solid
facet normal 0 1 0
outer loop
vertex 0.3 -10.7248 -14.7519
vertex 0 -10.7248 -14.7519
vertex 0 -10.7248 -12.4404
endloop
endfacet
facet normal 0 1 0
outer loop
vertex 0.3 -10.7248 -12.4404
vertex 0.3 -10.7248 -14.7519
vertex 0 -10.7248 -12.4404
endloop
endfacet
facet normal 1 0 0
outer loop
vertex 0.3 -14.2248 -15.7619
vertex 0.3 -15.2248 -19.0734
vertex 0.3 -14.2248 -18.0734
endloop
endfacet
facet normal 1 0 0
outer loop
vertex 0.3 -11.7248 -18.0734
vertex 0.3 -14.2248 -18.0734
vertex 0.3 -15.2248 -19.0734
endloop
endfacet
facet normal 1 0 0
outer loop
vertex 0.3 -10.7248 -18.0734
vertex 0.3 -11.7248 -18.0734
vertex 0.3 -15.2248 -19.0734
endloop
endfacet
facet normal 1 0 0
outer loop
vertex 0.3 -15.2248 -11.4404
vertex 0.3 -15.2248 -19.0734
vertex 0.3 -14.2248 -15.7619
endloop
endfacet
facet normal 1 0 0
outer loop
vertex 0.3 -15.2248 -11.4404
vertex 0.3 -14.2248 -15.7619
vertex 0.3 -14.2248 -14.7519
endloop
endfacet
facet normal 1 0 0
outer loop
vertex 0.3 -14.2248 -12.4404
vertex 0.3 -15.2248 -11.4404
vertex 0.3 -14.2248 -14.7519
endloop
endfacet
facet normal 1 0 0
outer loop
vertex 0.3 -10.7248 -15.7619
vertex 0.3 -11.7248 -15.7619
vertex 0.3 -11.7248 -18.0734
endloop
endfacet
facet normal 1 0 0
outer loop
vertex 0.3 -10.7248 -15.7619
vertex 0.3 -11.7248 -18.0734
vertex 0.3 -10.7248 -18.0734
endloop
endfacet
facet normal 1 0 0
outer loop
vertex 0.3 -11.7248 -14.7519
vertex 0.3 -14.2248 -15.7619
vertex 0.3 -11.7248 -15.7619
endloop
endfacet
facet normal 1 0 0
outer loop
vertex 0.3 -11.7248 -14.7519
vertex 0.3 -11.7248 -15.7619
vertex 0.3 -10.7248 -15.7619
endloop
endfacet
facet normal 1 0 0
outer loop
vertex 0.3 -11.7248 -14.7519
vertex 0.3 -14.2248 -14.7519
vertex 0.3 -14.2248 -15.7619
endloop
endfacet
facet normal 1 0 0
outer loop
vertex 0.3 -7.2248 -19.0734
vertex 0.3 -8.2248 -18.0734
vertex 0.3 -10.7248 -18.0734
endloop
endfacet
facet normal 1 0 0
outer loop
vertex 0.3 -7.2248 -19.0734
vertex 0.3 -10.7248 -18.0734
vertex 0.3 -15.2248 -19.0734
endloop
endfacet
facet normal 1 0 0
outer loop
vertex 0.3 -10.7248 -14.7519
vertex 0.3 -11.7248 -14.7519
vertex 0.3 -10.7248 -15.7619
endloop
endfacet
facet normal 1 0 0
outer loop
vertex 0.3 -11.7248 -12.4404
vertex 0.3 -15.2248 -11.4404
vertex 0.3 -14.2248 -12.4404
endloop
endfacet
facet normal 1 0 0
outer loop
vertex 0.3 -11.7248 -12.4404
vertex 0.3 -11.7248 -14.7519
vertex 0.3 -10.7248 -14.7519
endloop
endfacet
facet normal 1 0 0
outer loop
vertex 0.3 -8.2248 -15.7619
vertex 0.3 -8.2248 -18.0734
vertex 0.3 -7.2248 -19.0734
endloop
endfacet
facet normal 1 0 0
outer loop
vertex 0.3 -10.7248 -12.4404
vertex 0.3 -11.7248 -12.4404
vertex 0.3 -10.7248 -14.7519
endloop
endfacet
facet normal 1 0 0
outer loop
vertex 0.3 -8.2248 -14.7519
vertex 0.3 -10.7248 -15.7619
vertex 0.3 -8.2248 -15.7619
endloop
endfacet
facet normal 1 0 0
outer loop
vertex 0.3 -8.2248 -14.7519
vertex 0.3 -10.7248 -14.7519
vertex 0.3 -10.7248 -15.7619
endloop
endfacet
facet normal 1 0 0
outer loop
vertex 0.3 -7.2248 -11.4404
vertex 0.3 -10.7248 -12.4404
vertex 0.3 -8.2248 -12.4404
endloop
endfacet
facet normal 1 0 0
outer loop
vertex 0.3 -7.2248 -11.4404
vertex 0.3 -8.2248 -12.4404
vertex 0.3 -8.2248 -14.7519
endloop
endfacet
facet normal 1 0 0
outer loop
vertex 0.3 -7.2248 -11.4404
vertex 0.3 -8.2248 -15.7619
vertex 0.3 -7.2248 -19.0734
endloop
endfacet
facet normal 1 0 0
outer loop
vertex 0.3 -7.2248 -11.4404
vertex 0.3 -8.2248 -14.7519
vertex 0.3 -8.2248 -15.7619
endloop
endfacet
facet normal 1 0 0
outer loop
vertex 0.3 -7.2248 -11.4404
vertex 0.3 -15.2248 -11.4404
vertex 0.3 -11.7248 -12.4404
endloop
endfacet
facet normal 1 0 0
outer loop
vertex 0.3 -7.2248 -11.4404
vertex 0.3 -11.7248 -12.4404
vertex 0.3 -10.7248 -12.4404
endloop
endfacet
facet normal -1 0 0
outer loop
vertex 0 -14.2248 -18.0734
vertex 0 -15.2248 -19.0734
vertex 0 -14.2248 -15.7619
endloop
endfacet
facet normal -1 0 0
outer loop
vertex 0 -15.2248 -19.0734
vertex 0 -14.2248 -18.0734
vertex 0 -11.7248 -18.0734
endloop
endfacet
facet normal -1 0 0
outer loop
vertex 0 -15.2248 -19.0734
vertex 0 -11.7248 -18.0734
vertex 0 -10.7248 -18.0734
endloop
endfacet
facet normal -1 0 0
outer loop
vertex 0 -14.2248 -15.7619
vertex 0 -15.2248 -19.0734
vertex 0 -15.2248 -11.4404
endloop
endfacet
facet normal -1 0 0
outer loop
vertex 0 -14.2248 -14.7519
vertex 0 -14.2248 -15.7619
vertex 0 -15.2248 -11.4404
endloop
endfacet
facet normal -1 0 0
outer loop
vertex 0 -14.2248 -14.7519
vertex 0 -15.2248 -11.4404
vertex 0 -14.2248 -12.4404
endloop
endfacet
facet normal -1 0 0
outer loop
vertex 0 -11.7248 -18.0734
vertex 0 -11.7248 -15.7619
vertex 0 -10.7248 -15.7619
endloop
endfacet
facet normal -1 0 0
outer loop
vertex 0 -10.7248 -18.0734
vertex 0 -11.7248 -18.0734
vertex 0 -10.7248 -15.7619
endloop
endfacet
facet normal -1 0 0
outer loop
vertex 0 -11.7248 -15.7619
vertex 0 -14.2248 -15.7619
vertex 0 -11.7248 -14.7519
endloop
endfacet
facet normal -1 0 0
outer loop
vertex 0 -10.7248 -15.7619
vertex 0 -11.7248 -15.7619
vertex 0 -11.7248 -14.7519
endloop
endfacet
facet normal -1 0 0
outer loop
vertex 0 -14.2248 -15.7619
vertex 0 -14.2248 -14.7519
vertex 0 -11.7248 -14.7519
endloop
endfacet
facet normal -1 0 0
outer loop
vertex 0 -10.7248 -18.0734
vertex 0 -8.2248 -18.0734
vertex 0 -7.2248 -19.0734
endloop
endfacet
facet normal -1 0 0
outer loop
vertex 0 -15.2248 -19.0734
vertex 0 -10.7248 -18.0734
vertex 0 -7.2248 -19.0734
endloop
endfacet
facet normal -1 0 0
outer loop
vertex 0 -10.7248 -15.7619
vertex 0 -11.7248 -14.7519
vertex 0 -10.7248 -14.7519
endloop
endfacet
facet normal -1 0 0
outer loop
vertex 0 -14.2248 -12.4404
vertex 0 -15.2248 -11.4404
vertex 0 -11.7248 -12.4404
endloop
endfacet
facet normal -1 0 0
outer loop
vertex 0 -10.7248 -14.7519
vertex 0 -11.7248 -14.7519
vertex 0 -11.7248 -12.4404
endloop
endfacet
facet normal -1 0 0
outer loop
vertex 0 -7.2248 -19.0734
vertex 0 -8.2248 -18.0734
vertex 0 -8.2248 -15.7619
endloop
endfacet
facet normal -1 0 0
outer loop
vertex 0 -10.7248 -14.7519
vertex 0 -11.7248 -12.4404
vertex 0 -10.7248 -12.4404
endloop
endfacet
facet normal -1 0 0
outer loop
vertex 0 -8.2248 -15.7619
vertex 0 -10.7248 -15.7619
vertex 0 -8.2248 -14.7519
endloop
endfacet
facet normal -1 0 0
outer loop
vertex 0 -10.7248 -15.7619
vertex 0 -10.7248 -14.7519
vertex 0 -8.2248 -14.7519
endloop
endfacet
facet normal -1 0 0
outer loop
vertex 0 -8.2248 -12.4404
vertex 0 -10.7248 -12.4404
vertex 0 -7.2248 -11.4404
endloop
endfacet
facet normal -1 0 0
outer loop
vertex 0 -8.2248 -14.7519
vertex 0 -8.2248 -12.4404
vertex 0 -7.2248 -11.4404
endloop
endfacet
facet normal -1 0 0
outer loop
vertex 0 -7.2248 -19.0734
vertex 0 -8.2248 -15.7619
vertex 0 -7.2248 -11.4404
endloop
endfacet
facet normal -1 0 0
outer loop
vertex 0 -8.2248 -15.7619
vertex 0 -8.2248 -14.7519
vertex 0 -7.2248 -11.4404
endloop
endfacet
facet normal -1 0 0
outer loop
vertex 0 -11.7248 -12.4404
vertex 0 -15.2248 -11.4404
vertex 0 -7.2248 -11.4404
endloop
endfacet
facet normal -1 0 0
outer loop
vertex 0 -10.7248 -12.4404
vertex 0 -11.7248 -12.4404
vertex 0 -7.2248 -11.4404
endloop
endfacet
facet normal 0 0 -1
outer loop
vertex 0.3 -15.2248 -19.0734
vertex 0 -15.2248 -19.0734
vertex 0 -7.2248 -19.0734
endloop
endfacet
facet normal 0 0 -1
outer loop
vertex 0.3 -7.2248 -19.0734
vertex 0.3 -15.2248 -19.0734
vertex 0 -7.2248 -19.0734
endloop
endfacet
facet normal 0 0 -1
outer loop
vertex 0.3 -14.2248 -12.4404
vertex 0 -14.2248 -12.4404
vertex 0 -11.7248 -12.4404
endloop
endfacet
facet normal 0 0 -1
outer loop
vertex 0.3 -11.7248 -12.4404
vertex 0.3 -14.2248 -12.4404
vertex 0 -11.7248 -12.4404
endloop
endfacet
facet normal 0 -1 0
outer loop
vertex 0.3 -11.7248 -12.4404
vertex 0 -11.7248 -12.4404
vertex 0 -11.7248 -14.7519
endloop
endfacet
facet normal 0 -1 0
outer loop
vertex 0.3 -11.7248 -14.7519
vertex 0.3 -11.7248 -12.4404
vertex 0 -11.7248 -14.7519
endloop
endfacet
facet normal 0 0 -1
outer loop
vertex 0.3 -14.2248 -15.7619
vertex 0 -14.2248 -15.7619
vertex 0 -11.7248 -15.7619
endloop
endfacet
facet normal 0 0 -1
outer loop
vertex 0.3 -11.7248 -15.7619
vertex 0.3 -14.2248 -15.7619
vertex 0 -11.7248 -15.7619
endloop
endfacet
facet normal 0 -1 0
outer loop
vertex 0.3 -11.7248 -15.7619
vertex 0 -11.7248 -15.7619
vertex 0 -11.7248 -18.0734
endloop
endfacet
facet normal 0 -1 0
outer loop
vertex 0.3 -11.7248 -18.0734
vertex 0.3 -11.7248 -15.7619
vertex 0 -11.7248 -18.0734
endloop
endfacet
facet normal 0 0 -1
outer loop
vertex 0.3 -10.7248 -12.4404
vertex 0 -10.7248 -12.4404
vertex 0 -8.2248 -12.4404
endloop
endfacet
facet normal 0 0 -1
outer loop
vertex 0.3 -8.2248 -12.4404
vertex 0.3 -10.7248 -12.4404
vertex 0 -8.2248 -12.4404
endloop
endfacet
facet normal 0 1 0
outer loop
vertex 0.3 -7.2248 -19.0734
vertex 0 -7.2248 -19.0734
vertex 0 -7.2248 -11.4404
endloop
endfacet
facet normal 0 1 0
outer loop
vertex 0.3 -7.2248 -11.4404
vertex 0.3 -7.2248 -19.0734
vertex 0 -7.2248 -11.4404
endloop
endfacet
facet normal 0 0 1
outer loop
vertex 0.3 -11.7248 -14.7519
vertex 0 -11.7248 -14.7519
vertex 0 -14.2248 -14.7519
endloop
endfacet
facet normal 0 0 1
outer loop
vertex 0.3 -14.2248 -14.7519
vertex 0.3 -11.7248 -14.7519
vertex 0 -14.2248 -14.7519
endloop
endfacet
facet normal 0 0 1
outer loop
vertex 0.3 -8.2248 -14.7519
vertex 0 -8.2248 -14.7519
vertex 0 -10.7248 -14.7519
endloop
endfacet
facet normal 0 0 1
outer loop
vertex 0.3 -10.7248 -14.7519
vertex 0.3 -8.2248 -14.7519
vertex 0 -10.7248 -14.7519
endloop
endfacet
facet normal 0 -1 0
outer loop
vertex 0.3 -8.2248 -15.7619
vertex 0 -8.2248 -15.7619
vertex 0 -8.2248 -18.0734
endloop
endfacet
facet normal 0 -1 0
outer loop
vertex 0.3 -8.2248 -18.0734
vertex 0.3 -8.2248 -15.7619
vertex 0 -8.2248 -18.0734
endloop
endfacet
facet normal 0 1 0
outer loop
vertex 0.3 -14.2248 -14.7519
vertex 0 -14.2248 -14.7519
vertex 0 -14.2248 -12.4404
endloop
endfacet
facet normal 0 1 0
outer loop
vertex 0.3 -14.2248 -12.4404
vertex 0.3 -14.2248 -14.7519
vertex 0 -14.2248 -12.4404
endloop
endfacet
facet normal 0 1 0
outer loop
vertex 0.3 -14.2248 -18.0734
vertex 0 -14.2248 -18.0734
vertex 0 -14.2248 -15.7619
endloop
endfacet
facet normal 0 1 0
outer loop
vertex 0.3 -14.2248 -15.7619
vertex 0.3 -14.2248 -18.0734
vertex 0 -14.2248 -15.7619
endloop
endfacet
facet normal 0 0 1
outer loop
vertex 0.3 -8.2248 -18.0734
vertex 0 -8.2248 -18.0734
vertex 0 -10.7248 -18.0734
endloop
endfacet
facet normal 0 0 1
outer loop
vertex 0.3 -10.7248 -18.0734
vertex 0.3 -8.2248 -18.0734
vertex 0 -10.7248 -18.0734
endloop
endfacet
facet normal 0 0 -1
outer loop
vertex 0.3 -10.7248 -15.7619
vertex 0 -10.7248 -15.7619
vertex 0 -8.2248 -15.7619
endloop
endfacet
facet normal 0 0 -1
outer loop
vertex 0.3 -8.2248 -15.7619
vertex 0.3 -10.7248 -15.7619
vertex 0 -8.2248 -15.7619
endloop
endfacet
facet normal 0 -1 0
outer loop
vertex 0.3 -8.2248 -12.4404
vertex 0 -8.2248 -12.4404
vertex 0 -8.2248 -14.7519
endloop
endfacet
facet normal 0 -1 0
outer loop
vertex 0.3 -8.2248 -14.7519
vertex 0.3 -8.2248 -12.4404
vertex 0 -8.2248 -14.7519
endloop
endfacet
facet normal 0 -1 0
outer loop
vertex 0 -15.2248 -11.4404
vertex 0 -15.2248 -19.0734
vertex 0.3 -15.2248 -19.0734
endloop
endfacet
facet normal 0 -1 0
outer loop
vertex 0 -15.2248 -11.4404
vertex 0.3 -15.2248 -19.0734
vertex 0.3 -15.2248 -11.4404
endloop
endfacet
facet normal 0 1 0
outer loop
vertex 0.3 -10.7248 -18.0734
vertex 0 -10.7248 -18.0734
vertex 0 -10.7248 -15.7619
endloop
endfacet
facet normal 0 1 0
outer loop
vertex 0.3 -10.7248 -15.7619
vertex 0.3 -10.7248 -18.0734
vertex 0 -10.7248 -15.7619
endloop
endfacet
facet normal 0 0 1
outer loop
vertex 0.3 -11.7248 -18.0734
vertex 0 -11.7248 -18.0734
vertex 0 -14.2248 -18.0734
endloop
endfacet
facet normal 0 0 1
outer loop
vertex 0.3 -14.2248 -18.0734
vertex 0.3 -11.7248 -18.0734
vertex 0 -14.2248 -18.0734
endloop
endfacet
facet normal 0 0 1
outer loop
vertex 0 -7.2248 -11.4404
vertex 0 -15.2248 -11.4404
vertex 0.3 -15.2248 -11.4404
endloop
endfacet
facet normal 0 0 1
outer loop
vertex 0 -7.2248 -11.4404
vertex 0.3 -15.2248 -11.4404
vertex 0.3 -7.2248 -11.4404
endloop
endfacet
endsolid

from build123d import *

# Parameters (mm, degrees)
F0_W     = 8
F0_H     = 7.633
F1_DEPTH = 0.3


with BuildPart() as f1:
    # F0 (on Right) → F1 (new body)
    with BuildSketch(Plane.YZ):
        with Locations((-11.22477, -15.256895)):
            Rectangle(F0_W, F0_H)
        Polygon((-14.22477, -14.751895), (-14.22477, -12.440395), (-11.72477, -12.440395), (-10.72477, -12.440395), (-8.22477, -12.440395), (-8.22477, -14.751895), (-8.22477, -15.761895), (-8.22477, -18.073395), (-10.72477, -18.073395), (-11.72477, -18.073395), (-14.22477, -18.073395), (-14.22477, -15.761895), align=None, mode=Mode.SUBTRACT)
        Polygon((-10.72477, -12.440395), (-11.72477, -12.440395), (-11.72477, -14.751895), (-14.22477, -14.751895), (-14.22477, -15.761895), (-11.72477, -15.761895), (-11.72477, -18.073395), (-10.72477, -18.073395), (-10.72477, -15.761895), (-8.22477, -15.761895), (-8.22477, -14.751895), (-10.72477, -14.751895), align=None)
    extrude(amount=F1_DEPTH)


solid = f1.part
